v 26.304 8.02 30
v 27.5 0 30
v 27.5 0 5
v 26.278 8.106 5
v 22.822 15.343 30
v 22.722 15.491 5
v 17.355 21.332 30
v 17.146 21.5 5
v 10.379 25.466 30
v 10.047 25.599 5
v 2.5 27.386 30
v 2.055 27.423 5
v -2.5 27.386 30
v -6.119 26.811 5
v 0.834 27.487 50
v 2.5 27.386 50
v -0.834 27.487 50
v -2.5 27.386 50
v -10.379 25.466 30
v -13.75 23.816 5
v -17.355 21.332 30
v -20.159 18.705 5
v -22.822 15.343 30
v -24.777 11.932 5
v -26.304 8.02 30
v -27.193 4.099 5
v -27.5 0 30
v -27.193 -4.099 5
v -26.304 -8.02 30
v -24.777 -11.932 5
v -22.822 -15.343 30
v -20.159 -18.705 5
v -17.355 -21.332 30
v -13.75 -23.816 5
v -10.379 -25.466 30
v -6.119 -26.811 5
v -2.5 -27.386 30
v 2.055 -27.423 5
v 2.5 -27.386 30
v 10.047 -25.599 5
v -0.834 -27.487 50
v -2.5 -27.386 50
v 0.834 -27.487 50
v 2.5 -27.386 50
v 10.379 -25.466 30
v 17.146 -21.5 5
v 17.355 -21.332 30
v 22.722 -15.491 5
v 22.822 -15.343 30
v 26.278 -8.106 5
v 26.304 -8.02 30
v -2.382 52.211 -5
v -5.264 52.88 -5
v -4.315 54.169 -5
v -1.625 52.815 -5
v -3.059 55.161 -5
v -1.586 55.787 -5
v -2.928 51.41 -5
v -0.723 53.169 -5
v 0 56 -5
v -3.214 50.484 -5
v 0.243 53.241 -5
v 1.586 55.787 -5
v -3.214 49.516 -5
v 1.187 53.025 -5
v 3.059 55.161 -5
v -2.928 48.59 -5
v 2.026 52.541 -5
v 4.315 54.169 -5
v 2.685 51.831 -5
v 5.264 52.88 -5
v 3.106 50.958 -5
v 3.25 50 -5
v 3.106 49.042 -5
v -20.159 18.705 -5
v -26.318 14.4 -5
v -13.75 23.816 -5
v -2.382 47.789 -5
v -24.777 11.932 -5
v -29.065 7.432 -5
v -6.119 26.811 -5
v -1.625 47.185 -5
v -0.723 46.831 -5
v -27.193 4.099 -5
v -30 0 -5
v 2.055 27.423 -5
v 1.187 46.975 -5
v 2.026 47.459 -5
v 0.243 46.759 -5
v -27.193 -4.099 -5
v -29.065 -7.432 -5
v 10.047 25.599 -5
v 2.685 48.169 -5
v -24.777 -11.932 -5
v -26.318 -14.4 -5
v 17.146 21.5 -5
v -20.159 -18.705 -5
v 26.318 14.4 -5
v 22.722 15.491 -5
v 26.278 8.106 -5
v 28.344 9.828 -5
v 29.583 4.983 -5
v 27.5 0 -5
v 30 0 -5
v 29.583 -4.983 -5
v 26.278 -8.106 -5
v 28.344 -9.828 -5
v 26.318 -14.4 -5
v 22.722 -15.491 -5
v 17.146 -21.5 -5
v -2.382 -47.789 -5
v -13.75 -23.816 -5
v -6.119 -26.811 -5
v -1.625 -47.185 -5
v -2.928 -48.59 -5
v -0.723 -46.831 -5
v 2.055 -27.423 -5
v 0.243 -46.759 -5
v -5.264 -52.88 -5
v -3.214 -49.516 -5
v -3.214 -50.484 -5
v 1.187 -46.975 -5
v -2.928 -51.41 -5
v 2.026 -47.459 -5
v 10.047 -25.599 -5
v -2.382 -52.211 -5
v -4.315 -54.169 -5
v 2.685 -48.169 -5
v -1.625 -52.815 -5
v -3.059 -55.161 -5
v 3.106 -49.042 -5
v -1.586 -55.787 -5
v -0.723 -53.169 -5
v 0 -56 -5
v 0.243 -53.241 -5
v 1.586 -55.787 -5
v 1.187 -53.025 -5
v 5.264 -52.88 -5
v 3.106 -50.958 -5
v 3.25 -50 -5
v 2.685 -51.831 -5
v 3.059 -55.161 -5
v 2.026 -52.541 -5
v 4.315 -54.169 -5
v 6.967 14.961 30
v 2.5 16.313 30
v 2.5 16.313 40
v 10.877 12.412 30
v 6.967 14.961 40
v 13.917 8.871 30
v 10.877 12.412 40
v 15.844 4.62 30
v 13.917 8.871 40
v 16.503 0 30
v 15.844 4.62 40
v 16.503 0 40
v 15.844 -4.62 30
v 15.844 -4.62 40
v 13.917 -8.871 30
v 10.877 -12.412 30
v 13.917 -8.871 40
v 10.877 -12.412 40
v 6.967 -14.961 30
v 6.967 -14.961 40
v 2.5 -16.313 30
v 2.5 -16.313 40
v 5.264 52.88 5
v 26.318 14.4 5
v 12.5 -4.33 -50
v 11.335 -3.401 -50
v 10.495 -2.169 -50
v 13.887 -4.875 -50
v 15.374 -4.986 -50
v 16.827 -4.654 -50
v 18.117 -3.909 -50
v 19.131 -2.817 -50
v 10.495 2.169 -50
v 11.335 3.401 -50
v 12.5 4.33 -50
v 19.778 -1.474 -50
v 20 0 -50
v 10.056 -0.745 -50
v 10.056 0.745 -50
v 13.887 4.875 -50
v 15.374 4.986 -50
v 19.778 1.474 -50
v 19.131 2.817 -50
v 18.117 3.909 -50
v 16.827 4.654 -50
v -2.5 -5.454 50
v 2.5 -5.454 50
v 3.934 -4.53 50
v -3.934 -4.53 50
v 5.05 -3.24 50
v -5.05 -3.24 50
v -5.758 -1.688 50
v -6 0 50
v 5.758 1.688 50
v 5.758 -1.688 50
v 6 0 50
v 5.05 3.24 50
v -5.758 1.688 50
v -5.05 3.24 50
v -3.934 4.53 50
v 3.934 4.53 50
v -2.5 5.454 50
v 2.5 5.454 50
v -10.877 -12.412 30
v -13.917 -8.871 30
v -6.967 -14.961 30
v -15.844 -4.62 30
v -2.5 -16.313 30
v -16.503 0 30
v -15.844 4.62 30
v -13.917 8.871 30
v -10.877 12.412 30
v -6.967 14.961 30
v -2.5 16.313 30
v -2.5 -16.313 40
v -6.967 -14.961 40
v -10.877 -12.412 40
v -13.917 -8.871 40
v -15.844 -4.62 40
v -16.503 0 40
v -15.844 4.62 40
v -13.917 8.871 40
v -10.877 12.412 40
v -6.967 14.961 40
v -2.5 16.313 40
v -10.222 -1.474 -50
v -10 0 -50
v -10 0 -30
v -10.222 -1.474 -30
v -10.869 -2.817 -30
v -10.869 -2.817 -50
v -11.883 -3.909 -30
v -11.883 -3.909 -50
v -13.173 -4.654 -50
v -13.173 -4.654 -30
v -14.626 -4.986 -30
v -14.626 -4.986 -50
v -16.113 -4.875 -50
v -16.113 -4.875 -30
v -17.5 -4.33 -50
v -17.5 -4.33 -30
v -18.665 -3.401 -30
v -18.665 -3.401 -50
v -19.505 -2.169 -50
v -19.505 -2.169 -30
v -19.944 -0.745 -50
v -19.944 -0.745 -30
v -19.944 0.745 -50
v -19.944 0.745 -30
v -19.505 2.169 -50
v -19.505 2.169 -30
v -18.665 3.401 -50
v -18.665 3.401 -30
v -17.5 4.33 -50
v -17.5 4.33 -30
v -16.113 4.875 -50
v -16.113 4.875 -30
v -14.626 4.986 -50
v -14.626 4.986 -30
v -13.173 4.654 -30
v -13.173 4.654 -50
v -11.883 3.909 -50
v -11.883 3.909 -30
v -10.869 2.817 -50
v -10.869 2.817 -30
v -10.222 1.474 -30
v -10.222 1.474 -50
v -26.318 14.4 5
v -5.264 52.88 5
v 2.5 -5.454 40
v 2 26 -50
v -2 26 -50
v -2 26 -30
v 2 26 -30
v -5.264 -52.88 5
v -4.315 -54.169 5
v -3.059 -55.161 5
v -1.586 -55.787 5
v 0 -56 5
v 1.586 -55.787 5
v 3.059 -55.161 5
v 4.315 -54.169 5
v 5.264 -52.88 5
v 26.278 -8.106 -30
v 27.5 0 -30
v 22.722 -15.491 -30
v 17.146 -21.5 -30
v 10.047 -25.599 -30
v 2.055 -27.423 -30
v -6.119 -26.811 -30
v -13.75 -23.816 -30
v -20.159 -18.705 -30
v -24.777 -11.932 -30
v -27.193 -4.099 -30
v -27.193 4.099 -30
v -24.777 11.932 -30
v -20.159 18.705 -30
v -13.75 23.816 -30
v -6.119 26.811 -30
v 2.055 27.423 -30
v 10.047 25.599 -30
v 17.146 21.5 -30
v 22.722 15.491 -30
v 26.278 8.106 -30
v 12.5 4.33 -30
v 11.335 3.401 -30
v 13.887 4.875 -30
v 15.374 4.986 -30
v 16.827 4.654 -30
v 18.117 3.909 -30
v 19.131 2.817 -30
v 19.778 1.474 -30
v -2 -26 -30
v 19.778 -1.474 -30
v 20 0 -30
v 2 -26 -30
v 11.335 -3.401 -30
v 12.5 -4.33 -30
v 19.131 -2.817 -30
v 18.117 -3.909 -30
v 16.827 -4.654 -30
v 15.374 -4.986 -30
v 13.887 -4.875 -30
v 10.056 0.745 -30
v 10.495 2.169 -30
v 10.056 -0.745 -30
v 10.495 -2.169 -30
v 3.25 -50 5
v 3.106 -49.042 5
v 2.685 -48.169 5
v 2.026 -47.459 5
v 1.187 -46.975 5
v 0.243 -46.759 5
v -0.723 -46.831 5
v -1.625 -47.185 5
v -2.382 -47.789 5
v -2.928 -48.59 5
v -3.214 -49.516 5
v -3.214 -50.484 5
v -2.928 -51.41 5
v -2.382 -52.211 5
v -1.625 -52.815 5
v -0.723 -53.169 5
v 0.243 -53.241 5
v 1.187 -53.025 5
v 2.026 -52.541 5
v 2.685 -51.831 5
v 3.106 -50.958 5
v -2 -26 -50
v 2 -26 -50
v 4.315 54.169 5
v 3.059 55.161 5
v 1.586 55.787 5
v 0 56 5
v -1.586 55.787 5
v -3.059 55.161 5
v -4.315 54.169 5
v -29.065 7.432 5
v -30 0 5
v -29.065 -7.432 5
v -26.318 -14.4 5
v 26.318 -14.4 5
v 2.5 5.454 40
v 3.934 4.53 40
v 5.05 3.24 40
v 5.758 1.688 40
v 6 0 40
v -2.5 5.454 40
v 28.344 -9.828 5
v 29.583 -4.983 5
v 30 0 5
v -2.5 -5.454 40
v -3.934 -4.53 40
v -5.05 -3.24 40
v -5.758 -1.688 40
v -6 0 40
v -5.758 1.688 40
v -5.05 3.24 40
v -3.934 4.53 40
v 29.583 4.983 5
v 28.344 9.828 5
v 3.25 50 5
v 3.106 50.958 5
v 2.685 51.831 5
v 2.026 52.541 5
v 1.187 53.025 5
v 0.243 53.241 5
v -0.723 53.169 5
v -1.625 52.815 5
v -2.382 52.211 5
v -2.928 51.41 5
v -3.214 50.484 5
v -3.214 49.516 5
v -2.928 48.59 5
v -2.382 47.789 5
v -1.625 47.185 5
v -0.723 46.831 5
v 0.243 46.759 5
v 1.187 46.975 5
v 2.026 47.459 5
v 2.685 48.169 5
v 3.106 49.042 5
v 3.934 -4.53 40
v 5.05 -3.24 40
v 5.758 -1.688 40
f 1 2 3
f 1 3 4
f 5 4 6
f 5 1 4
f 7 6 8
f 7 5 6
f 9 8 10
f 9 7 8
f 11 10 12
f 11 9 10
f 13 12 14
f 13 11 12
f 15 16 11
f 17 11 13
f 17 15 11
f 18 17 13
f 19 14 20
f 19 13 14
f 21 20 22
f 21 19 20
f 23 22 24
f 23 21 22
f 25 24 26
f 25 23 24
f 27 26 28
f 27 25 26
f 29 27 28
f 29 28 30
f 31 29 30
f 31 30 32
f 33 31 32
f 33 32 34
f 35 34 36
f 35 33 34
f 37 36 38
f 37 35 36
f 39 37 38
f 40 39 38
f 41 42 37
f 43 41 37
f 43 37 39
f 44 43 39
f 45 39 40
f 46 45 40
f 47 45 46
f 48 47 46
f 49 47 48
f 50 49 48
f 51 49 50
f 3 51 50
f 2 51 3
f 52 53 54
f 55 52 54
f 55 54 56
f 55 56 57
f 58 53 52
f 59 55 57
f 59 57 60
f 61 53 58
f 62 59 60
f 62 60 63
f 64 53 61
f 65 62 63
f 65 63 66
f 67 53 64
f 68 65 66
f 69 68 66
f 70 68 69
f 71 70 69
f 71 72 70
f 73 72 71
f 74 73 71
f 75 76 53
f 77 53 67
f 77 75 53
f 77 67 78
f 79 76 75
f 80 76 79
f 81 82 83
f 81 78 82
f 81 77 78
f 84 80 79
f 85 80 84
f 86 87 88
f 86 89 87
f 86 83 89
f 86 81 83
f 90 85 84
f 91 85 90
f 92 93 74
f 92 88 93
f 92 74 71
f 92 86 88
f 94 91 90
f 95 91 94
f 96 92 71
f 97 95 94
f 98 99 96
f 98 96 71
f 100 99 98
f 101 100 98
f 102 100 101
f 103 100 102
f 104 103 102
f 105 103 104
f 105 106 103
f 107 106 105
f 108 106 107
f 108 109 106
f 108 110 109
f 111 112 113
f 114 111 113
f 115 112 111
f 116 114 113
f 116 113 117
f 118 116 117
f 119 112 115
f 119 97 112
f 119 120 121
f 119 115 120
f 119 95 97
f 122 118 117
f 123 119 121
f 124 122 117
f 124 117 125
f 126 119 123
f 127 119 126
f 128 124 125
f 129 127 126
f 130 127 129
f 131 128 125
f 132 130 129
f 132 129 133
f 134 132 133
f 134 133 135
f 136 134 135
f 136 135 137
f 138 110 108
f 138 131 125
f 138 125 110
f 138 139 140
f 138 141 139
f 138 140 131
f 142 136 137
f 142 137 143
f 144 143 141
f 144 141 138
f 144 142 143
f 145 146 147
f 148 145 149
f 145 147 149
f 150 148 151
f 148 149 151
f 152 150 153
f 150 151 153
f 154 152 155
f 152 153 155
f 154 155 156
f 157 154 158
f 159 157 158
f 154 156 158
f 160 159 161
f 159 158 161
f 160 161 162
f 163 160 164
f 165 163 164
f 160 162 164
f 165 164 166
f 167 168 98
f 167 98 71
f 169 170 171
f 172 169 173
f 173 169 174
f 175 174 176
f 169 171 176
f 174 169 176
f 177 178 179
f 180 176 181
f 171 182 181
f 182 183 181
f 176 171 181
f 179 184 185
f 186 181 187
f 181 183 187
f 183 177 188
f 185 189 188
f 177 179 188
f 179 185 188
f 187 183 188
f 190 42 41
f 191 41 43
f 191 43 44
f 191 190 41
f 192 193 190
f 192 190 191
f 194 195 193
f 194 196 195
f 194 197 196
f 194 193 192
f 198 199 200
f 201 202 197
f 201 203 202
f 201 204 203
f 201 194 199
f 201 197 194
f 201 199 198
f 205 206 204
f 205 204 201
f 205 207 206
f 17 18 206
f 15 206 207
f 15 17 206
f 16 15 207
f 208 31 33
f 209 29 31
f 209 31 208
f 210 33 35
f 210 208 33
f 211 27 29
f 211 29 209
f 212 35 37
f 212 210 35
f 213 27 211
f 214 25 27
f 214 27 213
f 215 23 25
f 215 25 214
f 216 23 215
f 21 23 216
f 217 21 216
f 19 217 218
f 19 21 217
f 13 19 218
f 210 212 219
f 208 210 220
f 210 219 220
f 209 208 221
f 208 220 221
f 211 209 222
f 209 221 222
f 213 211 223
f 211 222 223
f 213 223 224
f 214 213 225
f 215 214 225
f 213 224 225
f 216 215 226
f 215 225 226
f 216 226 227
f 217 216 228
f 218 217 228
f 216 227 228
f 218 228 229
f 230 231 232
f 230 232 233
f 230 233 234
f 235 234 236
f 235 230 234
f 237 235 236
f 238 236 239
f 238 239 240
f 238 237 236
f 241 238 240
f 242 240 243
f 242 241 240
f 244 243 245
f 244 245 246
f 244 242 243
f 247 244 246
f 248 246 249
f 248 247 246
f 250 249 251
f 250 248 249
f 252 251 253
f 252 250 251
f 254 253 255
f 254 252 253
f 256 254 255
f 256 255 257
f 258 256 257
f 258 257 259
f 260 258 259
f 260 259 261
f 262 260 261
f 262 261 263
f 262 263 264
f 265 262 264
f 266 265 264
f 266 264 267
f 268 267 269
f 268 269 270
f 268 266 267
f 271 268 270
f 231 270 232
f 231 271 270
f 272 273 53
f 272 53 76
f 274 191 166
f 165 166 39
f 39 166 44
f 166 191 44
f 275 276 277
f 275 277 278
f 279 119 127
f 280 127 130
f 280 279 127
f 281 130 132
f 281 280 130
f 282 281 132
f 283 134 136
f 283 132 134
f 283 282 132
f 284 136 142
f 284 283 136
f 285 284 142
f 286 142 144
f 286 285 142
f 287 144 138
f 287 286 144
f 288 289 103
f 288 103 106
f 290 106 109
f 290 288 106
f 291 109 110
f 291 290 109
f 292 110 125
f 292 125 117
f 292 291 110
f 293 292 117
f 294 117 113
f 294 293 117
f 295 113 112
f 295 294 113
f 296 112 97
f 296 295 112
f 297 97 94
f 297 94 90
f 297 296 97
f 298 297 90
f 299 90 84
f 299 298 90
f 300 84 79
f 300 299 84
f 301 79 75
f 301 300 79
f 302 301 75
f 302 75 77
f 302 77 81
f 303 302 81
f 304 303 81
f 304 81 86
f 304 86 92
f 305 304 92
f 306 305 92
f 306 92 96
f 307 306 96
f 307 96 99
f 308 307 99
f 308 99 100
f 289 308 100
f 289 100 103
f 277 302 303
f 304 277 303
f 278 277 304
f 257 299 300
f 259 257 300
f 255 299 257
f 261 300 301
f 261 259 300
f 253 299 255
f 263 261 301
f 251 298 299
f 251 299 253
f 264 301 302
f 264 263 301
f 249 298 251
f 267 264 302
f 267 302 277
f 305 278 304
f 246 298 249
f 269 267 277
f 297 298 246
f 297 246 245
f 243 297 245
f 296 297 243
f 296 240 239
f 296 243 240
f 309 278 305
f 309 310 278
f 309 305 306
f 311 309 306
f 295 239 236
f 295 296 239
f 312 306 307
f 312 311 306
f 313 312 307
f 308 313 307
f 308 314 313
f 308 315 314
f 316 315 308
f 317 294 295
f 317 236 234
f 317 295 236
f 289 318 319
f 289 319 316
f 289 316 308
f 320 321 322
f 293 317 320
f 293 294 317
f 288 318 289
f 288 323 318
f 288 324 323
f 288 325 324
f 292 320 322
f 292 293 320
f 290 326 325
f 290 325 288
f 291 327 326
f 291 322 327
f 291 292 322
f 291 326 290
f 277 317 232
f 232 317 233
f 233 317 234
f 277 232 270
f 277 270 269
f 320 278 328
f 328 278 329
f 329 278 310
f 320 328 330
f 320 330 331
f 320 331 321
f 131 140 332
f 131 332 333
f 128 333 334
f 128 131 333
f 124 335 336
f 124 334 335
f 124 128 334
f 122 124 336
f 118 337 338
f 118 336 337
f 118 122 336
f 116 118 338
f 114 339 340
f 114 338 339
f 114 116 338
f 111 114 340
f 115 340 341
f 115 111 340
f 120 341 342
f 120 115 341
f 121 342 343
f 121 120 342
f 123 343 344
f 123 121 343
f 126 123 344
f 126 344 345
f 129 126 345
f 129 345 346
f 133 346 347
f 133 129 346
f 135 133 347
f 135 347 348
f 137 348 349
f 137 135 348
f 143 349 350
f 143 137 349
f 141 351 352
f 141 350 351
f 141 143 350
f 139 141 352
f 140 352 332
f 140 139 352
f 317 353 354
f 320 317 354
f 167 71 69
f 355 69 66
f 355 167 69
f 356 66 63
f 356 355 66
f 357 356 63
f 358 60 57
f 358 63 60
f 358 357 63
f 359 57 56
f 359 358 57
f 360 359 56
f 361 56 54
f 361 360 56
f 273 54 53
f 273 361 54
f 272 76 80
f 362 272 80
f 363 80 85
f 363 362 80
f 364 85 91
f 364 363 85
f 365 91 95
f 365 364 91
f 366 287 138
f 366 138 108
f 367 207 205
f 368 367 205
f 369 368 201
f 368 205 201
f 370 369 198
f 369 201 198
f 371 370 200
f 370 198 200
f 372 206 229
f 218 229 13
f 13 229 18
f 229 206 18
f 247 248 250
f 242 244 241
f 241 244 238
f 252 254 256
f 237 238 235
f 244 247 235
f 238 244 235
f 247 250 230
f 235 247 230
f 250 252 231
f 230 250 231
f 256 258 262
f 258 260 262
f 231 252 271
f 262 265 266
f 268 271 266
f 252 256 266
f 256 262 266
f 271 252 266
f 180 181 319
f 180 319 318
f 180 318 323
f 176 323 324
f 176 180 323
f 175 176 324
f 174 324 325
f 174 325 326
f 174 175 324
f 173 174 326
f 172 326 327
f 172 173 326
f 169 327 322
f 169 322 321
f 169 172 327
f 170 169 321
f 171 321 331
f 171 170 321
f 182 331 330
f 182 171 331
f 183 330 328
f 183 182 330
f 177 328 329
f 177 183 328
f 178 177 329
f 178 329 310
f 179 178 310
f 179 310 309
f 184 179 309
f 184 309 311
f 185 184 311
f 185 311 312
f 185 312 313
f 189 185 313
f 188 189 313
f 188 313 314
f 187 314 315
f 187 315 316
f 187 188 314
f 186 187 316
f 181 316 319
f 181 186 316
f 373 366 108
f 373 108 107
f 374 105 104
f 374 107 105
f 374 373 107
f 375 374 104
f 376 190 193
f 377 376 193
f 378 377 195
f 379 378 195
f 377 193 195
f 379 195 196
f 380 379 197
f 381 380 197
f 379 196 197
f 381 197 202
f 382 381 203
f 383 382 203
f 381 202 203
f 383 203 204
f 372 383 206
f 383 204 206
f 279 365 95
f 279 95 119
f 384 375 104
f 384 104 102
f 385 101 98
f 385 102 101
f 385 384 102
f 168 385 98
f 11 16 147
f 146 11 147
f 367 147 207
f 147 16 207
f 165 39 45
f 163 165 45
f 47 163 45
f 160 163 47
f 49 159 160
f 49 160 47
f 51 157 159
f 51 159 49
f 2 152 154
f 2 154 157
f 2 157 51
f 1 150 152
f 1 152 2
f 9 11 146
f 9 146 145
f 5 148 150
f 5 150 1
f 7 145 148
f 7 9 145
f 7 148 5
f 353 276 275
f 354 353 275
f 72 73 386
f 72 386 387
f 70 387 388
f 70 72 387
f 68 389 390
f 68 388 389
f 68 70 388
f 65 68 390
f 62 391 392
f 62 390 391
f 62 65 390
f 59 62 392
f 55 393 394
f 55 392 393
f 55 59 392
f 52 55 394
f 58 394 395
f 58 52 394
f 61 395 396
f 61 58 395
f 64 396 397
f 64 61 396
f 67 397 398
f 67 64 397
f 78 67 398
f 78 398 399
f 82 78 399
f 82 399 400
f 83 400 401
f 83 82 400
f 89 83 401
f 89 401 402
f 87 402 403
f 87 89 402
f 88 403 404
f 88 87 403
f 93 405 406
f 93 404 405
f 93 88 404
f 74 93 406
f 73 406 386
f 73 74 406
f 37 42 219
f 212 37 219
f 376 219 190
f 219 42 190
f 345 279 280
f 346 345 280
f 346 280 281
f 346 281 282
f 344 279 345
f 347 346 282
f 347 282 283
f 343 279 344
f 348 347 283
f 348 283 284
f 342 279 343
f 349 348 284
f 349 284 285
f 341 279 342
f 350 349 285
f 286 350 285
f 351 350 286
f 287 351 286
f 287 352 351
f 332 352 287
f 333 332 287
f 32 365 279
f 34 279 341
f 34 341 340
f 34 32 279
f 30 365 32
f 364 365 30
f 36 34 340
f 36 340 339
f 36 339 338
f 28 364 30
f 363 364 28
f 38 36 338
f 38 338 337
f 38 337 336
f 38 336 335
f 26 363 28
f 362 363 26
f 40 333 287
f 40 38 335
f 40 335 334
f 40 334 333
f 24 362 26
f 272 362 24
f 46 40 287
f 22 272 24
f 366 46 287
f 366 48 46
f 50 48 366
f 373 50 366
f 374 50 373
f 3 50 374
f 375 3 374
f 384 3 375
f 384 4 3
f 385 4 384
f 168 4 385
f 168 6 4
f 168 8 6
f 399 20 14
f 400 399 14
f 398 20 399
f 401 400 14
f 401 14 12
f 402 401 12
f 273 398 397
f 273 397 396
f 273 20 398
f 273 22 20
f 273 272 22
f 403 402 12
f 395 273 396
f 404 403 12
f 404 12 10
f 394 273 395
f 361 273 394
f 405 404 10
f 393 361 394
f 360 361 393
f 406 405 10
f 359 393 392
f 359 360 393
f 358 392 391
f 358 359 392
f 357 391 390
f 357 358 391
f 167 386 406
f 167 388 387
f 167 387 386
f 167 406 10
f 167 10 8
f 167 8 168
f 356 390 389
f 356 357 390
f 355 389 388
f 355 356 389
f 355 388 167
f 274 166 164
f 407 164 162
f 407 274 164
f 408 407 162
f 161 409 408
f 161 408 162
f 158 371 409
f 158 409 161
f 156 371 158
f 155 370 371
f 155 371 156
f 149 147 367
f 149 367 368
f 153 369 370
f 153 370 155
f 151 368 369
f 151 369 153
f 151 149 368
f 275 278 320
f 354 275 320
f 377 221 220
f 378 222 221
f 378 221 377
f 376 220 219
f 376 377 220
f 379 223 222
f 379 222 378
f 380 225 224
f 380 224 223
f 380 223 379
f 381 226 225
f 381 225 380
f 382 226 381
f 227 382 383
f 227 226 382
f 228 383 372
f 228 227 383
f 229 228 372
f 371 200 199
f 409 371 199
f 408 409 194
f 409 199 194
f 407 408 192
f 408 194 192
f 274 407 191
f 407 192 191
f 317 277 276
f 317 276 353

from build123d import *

# Parameters (mm, degrees)
F0_R      = 3.25
F1_DEPTH  = 50
F2_W      = 120.846782
F2_H      = 139.899194
F2_R      = 27.5
F3_DEPTH  = 45
F5_DEPTH  = 20
F7_DEPTH  = 10
F8_R      = 3.25
F8_R_2    = 27.5
F9_DEPTH  = 45
F10_W     = 122.298393
F10_H     = 98.165326
F10_R     = 5
F11_DEPTH = 20
F12_W     = 4
F12_H     = 52
F13_DEPTH = 20


with BuildPart() as f1:
    # F0 (on Top) → F1 (new body, symmetric)
    with BuildSketch(Plane.XY):
        with BuildLine():
            ThreePointArc((26.318053, -14.400002), (29.064941, -7.431635), (30, 0))
            ThreePointArc((30, 0), (29.064941, 7.431635), (26.318053, 14.400002))
            ThreePointArc((26.318053, 14.400002), (0, 30), (-26.318053, 14.400002))
            ThreePointArc((-26.318053, 14.400002), (-30, 0), (-26.318053, -14.400002))
            ThreePointArc((-26.318053, -14.400002), (0, -30), (26.318053, -14.400002))
        make_face()
        with BuildLine():
            ThreePointArc((-26.318053, 14.400002), (0, 30), (26.318053, 14.400002))
            Line((26.318053, 14.400002), (5.263611, 52.88))
            ThreePointArc((5.263611, 52.88), (5.812988, 51.486327), (6, 50))
            ThreePointArc((6, 50), (-1.486327, 44.187012), (-5.263611, 52.88))
            Line((-5.263611, 52.88), (-26.318053, 14.400002))
        make_face()
        with BuildLine():
            Line((5.263611, -52.88), (26.318053, -14.400002))
            ThreePointArc((26.318053, -14.400002), (0, -30), (-26.318053, -14.400002))
            Line((-26.318053, -14.400002), (-5.263611, -52.88))
            ThreePointArc((-5.263611, -52.88), (-1.486327, -44.187012), (6, -50))
            ThreePointArc((6, -50), (5.812988, -51.486327), (5.263611, -52.88))
        make_face()
        with BuildLine():
            ThreePointArc((6, 50), (5.812988, 51.486327), (5.263611, 52.88))
            ThreePointArc((5.263611, 52.88), (0, 56), (-5.263611, 52.88))
            ThreePointArc((-5.263611, 52.88), (-1.486327, 44.187012), (6, 50))
        make_face()
        with Locations((0, 50)):
            Circle(F0_R, mode=Mode.SUBTRACT)
        with BuildLine():
            ThreePointArc((-5.263611, -52.88), (0, -56), (5.263611, -52.88))
            ThreePointArc((5.263611, -52.88), (5.812988, -51.486327), (6, -50))
            ThreePointArc((6, -50), (-1.486327, -44.187012), (-5.263611, -52.88))
        make_face()
        with Locations((0, -50)):
            Circle(F0_R, mode=Mode.SUBTRACT)
    extrude(amount=F1_DEPTH, both=True)

    # F2 (on face) → F3 (cut)
    with BuildSketch(Plane.XY.offset(50)):
        with Locations((4.808469, 0)):
            Rectangle(F2_W, F2_H)
        Circle(F2_R, mode=Mode.SUBTRACT)
    extrude(amount=-F3_DEPTH, mode=Mode.SUBTRACT)

    # F4 (on face) → F5 (cut)
    with BuildSketch(Plane.XY.offset(50)):
        with BuildLine():
            Line((-2.5, 16.312995), (-2.5, 38.387493))
            ThreePointArc((-2.5, 38.387493), (-38.468814, 0), (-2.5, -38.387493))
            Line((-2.5, -38.387493), (-2.5, -16.312995))
            ThreePointArc((-2.5, -16.312995), (-16.503448, 0), (-2.5, 16.312995))
        make_face()
        with BuildLine():
            ThreePointArc((2.5, -38.387493), (38.468814, 0), (2.5, 38.387493))
            Line((2.5, 38.387493), (2.5, 16.312995))
            ThreePointArc((2.5, 16.312995), (16.503448, 0), (2.5, -16.312995))
            Line((2.5, -16.312995), (2.5, -38.387493))
        make_face()
    extrude(amount=-F5_DEPTH, mode=Mode.SUBTRACT)

    # F6 (on face) → F7 (cut)
    with BuildSketch(Plane.XY.offset(50)):
        with BuildLine():
            ThreePointArc((2.5, 5.454356), (5.049752, 3.24037), (6, 0))
            ThreePointArc((6, 0), (5.049752, -3.24037), (2.5, -5.454356))
            Line((2.5, -5.454356), (2.5, -22.150979))
            ThreePointArc((2.5, -22.150979), (22.29161, 0), (2.5, 22.150979))
            Line((2.5, 22.150979), (2.5, 5.454356))
        make_face()
        with BuildLine():
            ThreePointArc((-2.5, -5.454356), (-6, 0), (-2.5, 5.454356))
            Line((-2.5, 5.454356), (-2.5, 22.150979))
            ThreePointArc((-2.5, 22.150979), (-22.29161, 0), (-2.5, -22.150979))
            Line((-2.5, -22.150979), (-2.5, -5.454356))
        make_face()
        with BuildLine():
            ThreePointArc((-2.5, -16.312995), (-16.503448, 0), (-2.5, 16.312995))
            Line((-2.5, 16.312995), (-2.5, 22.150979))
            ThreePointArc((-2.5, 22.150979), (-22.29161, 0), (-2.5, -22.150979))
            Line((-2.5, -22.150979), (-2.5, -16.312995))
        make_face()
        with BuildLine():
            Line((2.5, 22.150979), (2.5, 16.312995))
            ThreePointArc((2.5, 16.312995), (16.503448, 0), (2.5, -16.312995))
            Line((2.5, -16.312995), (2.5, -22.150979))
            ThreePointArc((2.5, -22.150979), (22.29161, 0), (2.5, 22.150979))
        make_face()
    extrude(amount=-F7_DEPTH, mode=Mode.SUBTRACT)

    # F8 (on face) → F9 (cut)
    with BuildSketch(Plane(origin=(0, 0, -50), x_dir=(1, 0, 0), z_dir=(0, 0, -1))):
        with BuildLine():
            Line((5.263611, -52.88), (26.318053, -14.400002))
            ThreePointArc((26.318053, -14.400002), (30, 0), (26.318053, 14.400002))
            Line((26.318053, 14.400002), (5.263611, 52.88))
            ThreePointArc((5.263611, 52.88), (0, 56), (-5.263611, 52.88))
            Line((-5.263611, 52.88), (-26.318053, 14.400002))
            ThreePointArc((-26.318053, 14.400002), (-30, 0), (-26.318053, -14.400002))
            Line((-26.318053, -14.400002), (-5.263611, -52.88))
            ThreePointArc((-5.263611, -52.88), (0, -56), (5.263611, -52.88))
        make_face()
        with Locations((0, -50)):
            Circle(F8_R, mode=Mode.SUBTRACT)
        Circle(F8_R_2, mode=Mode.SUBTRACT)
        with Locations((0, 50)):
            Circle(F8_R, mode=Mode.SUBTRACT)
    extrude(amount=-F9_DEPTH, mode=Mode.SUBTRACT)

    # F10 (on face) → F11 (cut)
    with BuildSketch(Plane(origin=(0, 0, -50), x_dir=(1, 0, 0), z_dir=(0, 0, -1))):
        with Locations((4.808468, -5.987905)):
            Rectangle(F10_W, F10_H)
        with Locations((-15, 0)):
            Circle(F10_R, mode=Mode.SUBTRACT)
        with Locations((15, 0)):
            Circle(F10_R, mode=Mode.SUBTRACT)
    extrude(amount=-F11_DEPTH, mode=Mode.SUBTRACT)

    # F12 (on face) → F13 (join)
    with BuildSketch(Plane(origin=(0, 0, -30), x_dir=(1, 0, 0), z_dir=(0, 0, -1))):
        Rectangle(F12_W, F12_H)
    extrude(amount=F13_DEPTH)


solid = f1.part
